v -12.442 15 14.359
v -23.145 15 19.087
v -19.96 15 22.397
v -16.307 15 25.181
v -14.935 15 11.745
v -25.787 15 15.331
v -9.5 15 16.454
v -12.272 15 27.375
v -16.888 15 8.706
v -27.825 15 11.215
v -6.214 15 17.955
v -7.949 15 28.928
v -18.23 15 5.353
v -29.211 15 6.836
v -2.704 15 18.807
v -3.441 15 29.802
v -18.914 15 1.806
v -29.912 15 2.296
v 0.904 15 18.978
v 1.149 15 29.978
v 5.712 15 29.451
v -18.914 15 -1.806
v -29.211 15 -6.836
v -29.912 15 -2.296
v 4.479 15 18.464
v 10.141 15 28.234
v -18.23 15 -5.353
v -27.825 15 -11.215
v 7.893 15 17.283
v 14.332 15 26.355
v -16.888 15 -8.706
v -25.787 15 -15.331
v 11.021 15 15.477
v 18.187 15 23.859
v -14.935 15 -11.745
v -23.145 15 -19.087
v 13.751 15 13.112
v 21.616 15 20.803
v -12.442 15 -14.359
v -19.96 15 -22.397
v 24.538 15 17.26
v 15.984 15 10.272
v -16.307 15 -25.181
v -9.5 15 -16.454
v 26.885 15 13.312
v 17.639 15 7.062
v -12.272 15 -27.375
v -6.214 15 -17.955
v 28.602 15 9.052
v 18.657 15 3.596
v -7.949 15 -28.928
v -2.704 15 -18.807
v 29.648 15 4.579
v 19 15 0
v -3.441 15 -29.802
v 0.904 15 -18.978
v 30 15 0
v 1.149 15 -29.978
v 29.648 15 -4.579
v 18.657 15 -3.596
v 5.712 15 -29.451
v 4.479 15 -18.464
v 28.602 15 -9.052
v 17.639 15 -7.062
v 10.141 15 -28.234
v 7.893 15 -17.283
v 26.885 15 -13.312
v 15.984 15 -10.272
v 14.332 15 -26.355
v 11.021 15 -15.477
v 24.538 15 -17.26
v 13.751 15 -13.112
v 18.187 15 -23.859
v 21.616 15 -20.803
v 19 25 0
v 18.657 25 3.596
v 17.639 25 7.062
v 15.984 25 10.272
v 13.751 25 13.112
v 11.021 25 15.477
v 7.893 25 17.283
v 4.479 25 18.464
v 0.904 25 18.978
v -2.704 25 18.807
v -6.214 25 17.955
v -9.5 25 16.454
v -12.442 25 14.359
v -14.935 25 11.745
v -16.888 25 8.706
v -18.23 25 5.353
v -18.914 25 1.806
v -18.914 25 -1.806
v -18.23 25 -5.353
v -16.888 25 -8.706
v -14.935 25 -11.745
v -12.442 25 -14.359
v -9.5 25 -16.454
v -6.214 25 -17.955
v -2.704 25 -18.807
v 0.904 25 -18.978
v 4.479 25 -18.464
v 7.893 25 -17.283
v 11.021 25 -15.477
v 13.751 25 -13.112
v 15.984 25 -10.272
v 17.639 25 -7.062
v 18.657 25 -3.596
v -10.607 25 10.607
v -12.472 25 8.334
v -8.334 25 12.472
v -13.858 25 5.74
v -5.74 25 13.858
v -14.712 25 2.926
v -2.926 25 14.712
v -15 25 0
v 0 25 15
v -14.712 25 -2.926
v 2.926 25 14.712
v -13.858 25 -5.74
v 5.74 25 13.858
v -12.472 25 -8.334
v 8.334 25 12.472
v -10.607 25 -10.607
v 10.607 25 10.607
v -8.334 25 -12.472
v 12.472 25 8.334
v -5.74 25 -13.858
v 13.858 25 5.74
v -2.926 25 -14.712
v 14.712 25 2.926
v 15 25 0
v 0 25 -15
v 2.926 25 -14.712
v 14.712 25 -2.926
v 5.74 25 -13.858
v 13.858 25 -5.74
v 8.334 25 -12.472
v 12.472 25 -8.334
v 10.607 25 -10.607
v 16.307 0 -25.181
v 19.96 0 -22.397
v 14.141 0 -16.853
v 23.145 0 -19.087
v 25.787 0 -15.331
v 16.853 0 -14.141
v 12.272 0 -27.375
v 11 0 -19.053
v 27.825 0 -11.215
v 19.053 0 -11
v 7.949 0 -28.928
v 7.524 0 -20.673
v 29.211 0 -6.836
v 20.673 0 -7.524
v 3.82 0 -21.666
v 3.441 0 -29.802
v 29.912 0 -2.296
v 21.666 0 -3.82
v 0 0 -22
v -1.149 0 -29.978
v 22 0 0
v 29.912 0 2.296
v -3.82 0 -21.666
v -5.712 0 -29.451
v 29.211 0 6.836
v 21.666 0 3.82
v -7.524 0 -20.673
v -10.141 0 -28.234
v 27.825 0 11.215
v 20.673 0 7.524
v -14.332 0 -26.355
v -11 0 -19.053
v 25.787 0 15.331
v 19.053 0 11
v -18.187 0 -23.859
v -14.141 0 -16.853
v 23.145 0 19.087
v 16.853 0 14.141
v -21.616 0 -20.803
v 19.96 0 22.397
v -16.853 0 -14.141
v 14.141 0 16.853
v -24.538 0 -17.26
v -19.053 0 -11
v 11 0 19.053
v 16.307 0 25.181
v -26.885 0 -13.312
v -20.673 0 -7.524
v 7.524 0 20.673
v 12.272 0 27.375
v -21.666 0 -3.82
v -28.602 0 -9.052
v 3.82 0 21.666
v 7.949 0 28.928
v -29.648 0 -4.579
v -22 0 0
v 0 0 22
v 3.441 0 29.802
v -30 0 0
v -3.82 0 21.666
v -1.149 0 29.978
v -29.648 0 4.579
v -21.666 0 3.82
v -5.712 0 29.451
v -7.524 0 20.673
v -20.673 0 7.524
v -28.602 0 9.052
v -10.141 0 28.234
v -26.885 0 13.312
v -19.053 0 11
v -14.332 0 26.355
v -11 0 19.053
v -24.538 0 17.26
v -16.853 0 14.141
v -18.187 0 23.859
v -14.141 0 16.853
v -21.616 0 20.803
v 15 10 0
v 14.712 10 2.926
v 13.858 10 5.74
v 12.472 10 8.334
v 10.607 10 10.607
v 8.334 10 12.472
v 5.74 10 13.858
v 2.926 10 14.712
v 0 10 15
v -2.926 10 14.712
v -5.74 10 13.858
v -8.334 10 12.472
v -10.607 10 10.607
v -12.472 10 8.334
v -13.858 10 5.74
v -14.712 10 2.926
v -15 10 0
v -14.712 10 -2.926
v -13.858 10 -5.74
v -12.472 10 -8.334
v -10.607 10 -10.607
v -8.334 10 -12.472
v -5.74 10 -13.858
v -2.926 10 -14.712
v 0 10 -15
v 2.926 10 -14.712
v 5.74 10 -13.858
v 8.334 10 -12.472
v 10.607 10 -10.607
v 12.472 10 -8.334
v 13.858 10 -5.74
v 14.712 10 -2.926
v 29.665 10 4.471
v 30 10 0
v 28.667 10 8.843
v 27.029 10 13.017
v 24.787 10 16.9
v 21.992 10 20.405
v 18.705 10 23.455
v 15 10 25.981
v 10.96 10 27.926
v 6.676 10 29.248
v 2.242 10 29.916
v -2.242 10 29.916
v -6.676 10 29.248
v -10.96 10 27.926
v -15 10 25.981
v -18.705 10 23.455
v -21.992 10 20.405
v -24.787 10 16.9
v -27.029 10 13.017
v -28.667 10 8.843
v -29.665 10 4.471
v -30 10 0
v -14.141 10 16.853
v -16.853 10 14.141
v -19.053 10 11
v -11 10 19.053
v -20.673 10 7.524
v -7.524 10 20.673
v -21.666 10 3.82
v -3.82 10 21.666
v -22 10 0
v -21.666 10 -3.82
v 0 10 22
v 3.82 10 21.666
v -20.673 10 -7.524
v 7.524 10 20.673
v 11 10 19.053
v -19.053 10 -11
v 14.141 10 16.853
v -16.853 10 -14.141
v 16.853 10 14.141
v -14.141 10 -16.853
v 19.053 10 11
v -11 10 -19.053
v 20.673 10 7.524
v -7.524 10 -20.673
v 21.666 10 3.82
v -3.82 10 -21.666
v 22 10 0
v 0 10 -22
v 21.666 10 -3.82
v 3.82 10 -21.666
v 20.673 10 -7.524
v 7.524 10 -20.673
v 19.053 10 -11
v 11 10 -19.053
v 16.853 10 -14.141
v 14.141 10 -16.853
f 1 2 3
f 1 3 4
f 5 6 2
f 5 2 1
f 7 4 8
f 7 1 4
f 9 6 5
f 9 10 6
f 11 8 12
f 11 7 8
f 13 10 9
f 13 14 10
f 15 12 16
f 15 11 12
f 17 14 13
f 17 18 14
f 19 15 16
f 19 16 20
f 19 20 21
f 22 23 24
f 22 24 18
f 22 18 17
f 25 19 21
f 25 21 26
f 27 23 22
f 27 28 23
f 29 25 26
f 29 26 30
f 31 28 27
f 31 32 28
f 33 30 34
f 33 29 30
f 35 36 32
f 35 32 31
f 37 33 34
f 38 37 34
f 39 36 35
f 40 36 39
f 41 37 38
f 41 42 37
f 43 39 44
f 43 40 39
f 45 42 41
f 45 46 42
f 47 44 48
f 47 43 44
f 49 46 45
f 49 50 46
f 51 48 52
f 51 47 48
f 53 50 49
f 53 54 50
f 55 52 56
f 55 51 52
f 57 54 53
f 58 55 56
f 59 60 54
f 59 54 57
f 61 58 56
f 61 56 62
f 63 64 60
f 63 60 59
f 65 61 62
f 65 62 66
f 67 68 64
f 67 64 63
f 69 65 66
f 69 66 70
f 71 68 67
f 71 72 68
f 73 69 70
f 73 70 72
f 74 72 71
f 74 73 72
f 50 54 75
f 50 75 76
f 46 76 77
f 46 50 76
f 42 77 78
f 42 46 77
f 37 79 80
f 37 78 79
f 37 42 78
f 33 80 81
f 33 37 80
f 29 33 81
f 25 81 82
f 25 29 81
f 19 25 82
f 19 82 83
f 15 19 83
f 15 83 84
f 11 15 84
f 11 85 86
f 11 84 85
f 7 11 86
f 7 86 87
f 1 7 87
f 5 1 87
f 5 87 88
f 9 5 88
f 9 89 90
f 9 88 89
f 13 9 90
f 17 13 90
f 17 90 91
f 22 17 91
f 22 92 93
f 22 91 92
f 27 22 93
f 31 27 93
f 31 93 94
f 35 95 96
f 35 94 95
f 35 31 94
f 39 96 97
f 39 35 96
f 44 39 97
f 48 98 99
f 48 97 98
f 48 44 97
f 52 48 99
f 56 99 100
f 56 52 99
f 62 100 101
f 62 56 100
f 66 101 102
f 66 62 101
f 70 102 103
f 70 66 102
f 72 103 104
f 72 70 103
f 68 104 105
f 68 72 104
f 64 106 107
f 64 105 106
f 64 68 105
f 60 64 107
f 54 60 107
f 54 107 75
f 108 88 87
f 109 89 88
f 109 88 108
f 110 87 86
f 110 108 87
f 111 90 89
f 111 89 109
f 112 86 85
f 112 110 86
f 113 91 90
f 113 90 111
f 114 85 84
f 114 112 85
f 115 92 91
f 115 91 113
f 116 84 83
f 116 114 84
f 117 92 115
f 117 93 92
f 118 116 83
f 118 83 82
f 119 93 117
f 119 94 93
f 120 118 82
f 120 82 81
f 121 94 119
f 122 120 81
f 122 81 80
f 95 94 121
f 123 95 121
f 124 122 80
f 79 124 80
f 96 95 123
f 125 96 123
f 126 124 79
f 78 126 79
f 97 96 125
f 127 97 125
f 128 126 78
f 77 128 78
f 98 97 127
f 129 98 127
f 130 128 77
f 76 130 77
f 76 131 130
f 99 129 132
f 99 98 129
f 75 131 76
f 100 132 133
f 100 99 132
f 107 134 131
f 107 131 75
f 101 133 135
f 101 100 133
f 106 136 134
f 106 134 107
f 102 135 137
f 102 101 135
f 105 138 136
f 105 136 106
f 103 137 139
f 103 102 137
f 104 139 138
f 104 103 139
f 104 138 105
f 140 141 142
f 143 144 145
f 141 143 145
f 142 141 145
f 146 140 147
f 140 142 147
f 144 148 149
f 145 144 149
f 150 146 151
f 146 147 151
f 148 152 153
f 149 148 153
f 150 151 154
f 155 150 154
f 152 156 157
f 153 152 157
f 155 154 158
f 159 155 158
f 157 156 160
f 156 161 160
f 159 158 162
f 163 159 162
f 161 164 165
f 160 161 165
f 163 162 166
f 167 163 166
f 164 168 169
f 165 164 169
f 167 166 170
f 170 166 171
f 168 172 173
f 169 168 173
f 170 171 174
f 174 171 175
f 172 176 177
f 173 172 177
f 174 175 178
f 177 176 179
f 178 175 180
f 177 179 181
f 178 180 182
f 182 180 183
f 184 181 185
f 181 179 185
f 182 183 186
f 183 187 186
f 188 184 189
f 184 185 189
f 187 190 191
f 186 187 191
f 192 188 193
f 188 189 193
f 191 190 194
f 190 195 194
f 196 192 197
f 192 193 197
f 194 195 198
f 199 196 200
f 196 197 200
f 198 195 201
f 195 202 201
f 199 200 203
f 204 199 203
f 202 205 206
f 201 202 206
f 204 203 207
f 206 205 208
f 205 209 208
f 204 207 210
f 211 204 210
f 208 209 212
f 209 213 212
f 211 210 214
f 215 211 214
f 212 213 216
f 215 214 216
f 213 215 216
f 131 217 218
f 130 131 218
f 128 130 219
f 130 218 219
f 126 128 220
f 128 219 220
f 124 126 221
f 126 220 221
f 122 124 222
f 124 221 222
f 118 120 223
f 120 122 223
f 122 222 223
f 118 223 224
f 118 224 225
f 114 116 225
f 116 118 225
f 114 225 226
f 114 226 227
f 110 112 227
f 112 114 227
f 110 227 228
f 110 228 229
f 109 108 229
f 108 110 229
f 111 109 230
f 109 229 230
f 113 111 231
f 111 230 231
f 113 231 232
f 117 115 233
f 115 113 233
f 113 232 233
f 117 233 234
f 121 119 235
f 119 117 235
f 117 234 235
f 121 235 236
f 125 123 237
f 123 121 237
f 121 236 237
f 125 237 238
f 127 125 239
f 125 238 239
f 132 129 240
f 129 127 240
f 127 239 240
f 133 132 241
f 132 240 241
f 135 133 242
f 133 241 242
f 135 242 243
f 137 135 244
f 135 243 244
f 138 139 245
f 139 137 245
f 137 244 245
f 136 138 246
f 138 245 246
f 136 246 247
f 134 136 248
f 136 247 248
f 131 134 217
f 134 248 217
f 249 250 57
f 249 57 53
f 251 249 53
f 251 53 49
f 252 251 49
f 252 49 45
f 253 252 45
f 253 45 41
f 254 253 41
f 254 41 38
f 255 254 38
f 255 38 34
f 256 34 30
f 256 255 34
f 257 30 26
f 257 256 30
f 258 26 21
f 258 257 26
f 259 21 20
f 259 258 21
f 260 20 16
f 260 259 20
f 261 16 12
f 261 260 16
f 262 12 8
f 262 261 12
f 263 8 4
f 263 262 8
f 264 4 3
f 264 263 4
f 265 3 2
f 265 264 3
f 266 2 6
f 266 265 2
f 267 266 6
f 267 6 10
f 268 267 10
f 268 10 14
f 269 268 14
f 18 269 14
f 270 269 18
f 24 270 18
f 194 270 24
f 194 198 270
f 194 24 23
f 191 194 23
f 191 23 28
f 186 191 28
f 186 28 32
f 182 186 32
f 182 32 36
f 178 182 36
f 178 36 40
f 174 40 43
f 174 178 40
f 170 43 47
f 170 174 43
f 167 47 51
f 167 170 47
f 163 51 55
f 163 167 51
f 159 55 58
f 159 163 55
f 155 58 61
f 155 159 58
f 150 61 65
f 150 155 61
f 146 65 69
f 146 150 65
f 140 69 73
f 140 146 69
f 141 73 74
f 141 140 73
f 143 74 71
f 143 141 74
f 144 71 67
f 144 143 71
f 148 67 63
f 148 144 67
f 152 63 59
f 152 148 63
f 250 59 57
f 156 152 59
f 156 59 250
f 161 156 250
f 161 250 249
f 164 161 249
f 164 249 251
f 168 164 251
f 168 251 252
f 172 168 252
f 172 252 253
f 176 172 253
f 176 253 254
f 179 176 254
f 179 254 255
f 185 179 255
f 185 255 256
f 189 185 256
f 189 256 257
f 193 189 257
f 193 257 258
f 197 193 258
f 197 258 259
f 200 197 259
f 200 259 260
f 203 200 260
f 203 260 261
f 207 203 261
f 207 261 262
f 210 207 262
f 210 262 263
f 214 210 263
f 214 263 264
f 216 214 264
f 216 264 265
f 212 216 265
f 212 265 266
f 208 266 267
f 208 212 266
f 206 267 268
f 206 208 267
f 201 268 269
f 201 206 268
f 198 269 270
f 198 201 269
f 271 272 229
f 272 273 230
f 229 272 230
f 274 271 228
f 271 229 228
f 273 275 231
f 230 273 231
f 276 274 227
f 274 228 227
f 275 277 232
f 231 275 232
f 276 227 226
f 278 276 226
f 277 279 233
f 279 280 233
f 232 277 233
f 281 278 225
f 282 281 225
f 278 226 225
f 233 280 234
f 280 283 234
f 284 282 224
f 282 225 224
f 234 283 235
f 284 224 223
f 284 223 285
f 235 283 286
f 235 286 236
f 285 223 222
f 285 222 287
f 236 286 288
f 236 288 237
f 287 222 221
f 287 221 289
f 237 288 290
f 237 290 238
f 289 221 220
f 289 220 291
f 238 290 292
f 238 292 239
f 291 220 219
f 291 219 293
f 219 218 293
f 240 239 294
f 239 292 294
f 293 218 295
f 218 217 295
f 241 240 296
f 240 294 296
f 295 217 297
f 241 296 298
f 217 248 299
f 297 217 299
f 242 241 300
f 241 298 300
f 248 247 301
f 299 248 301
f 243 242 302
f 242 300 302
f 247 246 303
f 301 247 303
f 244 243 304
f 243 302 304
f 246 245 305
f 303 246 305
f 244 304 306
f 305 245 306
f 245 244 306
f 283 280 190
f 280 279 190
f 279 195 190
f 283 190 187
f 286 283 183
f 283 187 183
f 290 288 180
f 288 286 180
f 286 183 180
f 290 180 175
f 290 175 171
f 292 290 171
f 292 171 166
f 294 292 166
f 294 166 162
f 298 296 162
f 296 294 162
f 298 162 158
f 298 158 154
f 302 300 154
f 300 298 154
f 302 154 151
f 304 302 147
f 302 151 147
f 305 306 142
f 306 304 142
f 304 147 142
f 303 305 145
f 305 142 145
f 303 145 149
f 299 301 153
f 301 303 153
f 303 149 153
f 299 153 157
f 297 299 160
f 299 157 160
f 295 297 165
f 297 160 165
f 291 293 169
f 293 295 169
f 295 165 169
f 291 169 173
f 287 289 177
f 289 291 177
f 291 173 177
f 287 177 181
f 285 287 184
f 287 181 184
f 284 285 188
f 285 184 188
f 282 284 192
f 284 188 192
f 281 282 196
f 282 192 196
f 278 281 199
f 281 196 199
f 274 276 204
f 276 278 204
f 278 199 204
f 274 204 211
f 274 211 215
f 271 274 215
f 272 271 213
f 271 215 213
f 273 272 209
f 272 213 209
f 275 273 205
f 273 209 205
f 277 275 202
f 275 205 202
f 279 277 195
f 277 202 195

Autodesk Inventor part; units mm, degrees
ref_plane "YZ Plane" through (0, 0, 0) normal (1, 0, 0) x (0, 1, 0)
ref_plane "XZ Plane" through (0, 0, 0) normal (0, 1, 0) x (-1, 0, 0)
ref_plane "XY Plane" through (0, 0, 0) normal (0, 0, 1) x (1, 0, 0)
sketch "Sketch2" plane through (0, 0, 0) normal (0, 1, 0) x (-1, 0, 0)
  circle A0 centre (0, 0) radius 22
  circle A1 centre (0, 0) radius 30
  dimension "d0" = 44
  dimension "d1" = 60
extrude "Extrusion1" add sketch "Sketch2" along normal blind 10
sketch "Sketch3" plane through (0, 10, 0) normal (0, 1, 0) x (1, 0, 0)
  circle A0 centre (0, 0) radius 30 projected
  circle A1 centre (0, 0) radius 15
  dimension "d4" = 30
extrude "Extrusion2" add sketch "Sketch3" along normal blind 5
sketch "Sketch4" plane through (0, 15, 0) normal (0, 1, 0) x (1, 0, 0)
  circle A0 centre (0, 0) radius 15
  circle A1 centre (0, 0) radius 19
  dimension "d7" = 38
  dimension "d8" = 30
extrude "Extrusion3" add sketch "Sketch4" along normal blind 10
properties part number "smallbearingcup" material "Steel"
